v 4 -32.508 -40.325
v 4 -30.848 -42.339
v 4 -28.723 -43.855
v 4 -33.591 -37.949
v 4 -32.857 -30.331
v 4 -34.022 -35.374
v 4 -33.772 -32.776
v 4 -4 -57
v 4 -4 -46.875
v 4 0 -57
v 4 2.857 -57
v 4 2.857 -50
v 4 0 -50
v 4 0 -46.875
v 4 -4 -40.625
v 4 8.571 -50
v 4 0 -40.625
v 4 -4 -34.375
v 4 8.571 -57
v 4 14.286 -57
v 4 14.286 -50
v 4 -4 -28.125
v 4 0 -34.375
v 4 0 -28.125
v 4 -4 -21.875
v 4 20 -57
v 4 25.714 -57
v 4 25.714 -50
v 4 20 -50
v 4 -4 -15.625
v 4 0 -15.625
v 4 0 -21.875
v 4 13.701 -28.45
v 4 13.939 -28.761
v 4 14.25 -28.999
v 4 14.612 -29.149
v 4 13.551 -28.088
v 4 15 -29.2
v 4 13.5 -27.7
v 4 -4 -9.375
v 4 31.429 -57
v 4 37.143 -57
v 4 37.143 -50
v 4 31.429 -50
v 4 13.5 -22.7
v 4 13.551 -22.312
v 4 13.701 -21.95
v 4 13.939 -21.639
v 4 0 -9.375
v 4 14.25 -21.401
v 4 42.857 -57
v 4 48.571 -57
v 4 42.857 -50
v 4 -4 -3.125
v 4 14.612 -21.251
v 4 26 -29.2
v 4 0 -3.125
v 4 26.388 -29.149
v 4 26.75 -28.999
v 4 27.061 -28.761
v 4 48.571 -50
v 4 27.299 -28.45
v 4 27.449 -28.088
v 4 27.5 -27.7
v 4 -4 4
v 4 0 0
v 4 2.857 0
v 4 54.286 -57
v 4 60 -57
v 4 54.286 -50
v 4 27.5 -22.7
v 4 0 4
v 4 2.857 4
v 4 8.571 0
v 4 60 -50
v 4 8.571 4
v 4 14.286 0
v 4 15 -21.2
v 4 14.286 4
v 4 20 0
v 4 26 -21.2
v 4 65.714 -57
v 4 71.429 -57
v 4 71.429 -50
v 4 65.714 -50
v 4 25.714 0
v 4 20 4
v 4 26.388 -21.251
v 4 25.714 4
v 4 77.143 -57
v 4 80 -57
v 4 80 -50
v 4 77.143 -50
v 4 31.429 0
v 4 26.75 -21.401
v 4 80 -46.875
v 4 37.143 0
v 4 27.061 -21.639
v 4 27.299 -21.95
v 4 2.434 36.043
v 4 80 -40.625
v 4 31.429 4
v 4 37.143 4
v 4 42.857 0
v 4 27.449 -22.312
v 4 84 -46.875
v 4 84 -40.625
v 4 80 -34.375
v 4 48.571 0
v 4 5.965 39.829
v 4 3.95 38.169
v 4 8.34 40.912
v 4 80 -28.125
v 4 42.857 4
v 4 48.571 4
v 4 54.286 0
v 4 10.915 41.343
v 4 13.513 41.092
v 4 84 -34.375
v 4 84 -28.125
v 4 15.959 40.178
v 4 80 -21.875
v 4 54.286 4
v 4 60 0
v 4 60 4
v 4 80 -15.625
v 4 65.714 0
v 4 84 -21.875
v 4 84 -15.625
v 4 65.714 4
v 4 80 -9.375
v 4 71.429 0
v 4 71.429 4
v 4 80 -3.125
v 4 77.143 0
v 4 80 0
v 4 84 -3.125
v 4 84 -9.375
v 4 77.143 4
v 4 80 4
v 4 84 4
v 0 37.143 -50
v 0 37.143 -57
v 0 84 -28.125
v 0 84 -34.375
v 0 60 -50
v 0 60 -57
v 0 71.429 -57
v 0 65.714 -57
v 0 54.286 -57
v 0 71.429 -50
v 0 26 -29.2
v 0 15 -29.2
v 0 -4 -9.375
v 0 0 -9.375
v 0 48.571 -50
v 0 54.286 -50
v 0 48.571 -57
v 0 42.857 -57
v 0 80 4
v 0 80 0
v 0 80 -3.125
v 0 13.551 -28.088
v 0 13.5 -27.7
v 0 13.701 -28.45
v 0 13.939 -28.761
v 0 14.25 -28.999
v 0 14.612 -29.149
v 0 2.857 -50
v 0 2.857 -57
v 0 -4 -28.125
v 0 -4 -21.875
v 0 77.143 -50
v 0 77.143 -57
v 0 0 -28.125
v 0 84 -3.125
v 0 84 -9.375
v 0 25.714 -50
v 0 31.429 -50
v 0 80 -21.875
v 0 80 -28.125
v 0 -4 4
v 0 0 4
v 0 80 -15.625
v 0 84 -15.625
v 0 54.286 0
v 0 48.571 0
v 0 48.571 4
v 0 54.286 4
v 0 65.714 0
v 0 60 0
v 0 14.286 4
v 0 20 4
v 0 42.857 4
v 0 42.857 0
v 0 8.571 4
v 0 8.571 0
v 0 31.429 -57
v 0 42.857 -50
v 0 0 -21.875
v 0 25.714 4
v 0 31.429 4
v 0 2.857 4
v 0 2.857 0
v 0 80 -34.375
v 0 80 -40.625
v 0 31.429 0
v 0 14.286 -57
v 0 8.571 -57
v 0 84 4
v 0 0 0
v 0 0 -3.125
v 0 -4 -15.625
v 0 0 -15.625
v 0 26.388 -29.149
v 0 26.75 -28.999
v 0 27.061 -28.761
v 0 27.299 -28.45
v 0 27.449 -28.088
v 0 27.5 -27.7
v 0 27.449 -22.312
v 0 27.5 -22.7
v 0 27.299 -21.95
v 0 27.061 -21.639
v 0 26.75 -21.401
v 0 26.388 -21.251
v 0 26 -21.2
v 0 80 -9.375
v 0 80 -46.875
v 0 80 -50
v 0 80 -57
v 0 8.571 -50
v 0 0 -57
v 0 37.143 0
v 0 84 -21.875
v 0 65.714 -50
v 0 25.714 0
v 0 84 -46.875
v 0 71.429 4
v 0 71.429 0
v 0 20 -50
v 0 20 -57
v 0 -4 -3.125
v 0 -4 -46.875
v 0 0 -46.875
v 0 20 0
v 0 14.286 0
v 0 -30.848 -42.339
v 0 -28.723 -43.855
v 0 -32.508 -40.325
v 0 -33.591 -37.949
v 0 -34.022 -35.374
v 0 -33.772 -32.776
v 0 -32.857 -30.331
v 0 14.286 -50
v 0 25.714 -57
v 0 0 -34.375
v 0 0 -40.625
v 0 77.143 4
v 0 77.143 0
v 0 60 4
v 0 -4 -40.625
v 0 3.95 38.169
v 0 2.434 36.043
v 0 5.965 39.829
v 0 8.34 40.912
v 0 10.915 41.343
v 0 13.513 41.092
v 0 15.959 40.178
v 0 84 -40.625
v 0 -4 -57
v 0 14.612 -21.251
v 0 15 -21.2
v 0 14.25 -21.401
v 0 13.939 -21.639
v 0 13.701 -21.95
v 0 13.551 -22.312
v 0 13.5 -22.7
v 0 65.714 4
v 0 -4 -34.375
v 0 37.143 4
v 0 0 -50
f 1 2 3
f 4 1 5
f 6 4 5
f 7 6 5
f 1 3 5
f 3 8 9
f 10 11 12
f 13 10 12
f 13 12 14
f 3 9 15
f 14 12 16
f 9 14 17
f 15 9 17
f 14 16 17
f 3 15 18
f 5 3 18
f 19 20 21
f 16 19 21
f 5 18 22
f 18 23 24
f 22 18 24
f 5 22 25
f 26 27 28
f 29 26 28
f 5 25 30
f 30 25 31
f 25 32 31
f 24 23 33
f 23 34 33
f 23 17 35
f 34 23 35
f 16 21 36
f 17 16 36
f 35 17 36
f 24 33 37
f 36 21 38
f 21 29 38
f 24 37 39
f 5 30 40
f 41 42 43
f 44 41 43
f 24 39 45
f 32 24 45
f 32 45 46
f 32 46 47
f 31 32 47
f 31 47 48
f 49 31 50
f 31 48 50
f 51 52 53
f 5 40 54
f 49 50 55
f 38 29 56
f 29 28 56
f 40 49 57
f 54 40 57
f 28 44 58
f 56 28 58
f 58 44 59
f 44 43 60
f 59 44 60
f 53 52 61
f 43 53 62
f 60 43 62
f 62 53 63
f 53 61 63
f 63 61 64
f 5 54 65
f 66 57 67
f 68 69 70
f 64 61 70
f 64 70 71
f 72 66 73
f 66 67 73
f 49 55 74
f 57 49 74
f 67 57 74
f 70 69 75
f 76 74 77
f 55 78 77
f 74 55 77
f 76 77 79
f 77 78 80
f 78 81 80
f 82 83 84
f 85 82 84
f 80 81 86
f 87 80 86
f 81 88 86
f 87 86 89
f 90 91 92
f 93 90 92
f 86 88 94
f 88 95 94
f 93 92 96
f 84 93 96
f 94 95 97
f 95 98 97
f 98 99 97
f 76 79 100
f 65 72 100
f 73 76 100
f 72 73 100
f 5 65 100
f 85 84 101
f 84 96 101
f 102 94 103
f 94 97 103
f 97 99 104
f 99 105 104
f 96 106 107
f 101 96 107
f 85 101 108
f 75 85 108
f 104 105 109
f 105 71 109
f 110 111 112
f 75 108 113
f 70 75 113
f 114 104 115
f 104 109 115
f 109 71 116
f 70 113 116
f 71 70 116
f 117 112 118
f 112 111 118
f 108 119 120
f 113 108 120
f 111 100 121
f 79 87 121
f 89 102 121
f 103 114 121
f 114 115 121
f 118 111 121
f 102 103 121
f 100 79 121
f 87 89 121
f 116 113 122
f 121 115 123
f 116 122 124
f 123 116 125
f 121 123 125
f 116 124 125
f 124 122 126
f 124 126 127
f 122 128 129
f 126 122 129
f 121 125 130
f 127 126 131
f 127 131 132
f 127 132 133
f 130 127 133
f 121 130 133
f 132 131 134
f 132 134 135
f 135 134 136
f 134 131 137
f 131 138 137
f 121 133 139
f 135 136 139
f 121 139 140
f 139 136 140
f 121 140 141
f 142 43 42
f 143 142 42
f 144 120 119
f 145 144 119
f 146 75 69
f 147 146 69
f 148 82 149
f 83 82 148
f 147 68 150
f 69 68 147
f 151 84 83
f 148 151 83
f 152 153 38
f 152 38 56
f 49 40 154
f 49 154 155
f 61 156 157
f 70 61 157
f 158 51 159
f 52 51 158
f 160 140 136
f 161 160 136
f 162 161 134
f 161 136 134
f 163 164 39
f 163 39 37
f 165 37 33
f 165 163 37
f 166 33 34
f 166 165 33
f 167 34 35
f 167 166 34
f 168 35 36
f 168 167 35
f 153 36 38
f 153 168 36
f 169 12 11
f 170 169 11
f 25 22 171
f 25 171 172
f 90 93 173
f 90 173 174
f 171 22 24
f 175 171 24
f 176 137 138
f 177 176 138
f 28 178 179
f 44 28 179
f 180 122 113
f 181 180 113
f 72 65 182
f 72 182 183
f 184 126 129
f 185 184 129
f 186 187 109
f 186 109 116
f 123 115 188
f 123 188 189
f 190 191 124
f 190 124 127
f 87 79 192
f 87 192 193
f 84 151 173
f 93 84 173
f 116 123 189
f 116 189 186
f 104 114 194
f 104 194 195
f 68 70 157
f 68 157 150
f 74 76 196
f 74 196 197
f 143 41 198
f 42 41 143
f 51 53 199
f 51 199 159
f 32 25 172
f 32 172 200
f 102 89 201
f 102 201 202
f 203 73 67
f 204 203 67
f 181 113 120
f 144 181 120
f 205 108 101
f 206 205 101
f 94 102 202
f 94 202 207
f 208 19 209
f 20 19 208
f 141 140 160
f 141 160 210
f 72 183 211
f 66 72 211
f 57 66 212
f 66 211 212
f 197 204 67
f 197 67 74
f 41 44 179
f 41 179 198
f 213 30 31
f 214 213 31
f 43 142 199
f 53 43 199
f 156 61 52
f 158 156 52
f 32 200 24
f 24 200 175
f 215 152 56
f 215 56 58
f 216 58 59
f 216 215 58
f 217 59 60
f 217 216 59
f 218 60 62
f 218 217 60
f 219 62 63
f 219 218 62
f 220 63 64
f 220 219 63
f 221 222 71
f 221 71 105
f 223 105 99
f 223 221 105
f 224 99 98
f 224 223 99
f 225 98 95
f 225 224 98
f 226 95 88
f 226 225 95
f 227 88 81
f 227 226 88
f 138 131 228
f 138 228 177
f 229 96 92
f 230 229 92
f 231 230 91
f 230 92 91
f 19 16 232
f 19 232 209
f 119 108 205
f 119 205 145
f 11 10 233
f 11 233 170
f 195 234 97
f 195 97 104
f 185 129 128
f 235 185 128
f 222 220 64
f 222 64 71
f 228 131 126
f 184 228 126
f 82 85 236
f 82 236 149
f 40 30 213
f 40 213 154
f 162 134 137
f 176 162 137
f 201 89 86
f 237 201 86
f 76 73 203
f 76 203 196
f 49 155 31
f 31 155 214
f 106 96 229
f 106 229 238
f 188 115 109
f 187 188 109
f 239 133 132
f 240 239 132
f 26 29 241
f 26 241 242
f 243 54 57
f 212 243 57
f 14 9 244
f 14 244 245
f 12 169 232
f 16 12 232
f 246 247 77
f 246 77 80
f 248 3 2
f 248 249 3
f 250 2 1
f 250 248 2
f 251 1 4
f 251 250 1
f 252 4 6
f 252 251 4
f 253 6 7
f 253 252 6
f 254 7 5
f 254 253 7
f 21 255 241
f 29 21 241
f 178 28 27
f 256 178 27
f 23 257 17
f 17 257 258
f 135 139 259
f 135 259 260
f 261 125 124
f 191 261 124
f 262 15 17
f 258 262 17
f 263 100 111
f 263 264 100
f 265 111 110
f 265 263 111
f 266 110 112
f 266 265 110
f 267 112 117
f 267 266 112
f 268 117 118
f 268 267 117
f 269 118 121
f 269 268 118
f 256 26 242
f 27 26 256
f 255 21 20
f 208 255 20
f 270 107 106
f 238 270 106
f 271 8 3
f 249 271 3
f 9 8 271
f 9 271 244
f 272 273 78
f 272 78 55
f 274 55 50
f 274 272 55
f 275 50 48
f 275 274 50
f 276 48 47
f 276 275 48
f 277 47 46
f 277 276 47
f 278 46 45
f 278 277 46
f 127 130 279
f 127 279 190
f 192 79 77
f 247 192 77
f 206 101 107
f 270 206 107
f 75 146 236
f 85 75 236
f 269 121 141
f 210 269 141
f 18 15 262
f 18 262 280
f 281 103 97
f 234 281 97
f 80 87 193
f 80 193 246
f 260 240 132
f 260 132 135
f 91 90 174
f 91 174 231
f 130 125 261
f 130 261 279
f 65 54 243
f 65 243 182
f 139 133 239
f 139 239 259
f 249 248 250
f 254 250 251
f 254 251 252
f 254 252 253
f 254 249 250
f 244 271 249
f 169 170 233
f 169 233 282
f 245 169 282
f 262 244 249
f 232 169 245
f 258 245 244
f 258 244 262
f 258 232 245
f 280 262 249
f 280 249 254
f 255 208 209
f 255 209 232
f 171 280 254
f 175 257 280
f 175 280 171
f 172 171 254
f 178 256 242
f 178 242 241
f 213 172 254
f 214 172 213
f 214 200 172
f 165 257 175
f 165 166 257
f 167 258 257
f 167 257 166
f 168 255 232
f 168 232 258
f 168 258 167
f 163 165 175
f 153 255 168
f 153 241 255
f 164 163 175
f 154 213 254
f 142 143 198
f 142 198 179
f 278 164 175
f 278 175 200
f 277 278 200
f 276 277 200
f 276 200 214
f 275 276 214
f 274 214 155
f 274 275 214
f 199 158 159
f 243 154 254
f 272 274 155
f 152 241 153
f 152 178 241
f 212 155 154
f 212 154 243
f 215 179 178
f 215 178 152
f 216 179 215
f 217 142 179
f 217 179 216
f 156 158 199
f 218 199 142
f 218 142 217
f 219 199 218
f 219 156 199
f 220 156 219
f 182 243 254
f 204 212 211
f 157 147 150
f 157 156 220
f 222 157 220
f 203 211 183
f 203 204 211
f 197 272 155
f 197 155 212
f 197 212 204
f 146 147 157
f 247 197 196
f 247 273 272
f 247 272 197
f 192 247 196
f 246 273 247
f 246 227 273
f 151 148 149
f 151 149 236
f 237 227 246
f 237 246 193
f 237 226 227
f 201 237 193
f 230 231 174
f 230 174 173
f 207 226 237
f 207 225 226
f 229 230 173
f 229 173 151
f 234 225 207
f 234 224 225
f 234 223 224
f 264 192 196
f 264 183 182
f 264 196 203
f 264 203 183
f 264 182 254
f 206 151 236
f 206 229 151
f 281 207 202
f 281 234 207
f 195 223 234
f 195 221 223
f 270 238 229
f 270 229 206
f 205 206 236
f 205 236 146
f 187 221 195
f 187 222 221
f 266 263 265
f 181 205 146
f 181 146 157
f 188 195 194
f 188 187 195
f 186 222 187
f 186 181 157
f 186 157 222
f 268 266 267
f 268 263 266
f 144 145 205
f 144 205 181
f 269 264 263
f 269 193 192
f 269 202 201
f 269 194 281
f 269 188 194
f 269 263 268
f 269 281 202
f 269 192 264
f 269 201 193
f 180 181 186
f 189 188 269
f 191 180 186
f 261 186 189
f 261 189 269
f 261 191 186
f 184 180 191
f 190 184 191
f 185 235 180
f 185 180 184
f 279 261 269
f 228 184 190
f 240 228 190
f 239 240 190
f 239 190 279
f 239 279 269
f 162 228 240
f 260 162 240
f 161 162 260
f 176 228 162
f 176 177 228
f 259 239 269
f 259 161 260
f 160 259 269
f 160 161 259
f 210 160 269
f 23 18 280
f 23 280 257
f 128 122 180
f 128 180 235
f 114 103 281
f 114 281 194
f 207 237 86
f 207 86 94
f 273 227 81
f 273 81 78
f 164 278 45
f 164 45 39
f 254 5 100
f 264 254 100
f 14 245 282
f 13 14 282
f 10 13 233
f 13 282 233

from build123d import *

# Parameters (mm, degrees)
SCHIZZO1_W                    = 50
SCHIZZO1_H                    = 80
ESTRUSIONE_ESTRUSIONE1_DEPTH  = 4
SCHIZZO2_W                    = 4
SCHIZZO2_H                    = 2.857142857
SCHIZZO2_W_2                  = 7
ESTRUSIONE_ESTRUSIONE2_DEPTH  = 4
SCHIZZO3_W                    = 4
SCHIZZO3_H                    = 5.714285715
SCHIZZO3_W_2                  = 7
ESTRUSIONE_ESTRUSIONE3_DEPTH  = 4
RIPETIZIONE_A_L1_COUNT        = 6
RIPETIZIONE_A_L1_PITCH        = 11.428571
SCHIZZO4_W                    = 6.25
SCHIZZO4_H                    = 4
ESTRUSIONE_ESTRUSIONE4_DEPTH  = 4
RIPETIZIONE_A_L2_COUNT        = 4
RIPETIZIONE_A_L2_PITCH        = 12.5
ESTRUSIONE_ESTRUSIONE5_DEPTH  = 4
RACCORDO1_R                   = 10
TAGLIO_ESTRUSIONE1_DEPTH      = 102.592322545
TAGLIO_ESTRUSIONE1_DEPTH_BACK = 102.592322545


with BuildPart() as part:
    # Schizzo1 → Estrusione-Estrusione1 (new body)
    with BuildSketch(Plane(origin=(0, 0, 0), x_dir=(0, 0, -1), z_dir=(1, 0, 0))):
        with Locations((25, 40)):
            Rectangle(SCHIZZO1_W, SCHIZZO1_H)
    extrude(amount=ESTRUSIONE_ESTRUSIONE1_DEPTH)

    # Schizzo2 → Estrusione-Estrusione2 (add)
    with BuildSketch(Plane(origin=(4, 0, 0), x_dir=(0, 0, -1), z_dir=(1, 0, 0))):
        with Locations((-2, 78.571428572)):
            Rectangle(SCHIZZO2_W, SCHIZZO2_H)
        with Locations((53.5, 78.571428572)):
            Rectangle(SCHIZZO2_W_2, SCHIZZO2_H)
        with Locations((53.5, 1.428571429)):
            Rectangle(SCHIZZO2_W_2, SCHIZZO2_H)
        with Locations((-2, 1.428571429)):
            Rectangle(SCHIZZO2_W, SCHIZZO2_H)
    extrude(amount=-ESTRUSIONE_ESTRUSIONE2_DEPTH)

    # Schizzo3 → Estrusione-Estrusione3 (add)
    with BuildSketch(Plane(origin=(4, 0, 0), x_dir=(0, 0, -1), z_dir=(1, 0, 0))):
        with Locations((-2, 68.571428572)):
            Rectangle(SCHIZZO3_W, SCHIZZO3_H)
        with Locations((53.5, 68.571428572)):
            Rectangle(SCHIZZO3_W_2, SCHIZZO3_H)
    estrusione_estrusione3 = extrude(amount=-ESTRUSIONE_ESTRUSIONE3_DEPTH)

    # Ripetizione a L1: Estrusione-Estrusione3 ×6
    with Locations(*[(0, -i * RIPETIZIONE_A_L1_PITCH, 0) for i in range(1, RIPETIZIONE_A_L1_COUNT)]):
        add(estrusione_estrusione3)

    # Schizzo4 → Estrusione-Estrusione4 (add)
    with BuildSketch(Plane(origin=(4, 0, 0), x_dir=(0, 0, -1), z_dir=(1, 0, 0))):
        with Locations((6.25, 82)):
            Rectangle(SCHIZZO4_W, SCHIZZO4_H)
        with Locations((6.25, -2)):
            Rectangle(SCHIZZO4_W, SCHIZZO4_H)
    estrusione_estrusione4 = extrude(amount=-ESTRUSIONE_ESTRUSIONE4_DEPTH)

    # Ripetizione a L2: Estrusione-Estrusione4 ×4
    with Locations(*[(0, 0, -i * RIPETIZIONE_A_L2_PITCH) for i in range(1, RIPETIZIONE_A_L2_COUNT)]):
        add(estrusione_estrusione4)

    # Schizzo5 → Estrusione-Estrusione5 (add)
    with BuildSketch(Plane(origin=(4, 0, 0), x_dir=(0, 0, -1), z_dir=(1, 0, 0))):
        Polygon((46.875, -4), (57, -4), (39.160080614, -37.552008529), (-44.872956134, 7.129149682), (-4, 84), (-4, 80), (-4, -4), align=None)
    extrude(amount=-ESTRUSIONE_ESTRUSIONE5_DEPTH)

    # Raccordo1
    raccordo1_edges = [part.edges().sort_by_distance(p)[0] for p in [
        (2, -37.552008529, -39.160080614),
        (2, 7.129149682, 44.872956134),
    ]]
    fillet(raccordo1_edges, radius=RACCORDO1_R)

    # Schizzo6 → Taglio-Estrusione1 (cut, two sides: drawn at the far end of the back side and taken through both)
    with BuildSketch(Plane(origin=(4, 0, 0), x_dir=(0, 0, -1), z_dir=(1, 0, 0)).offset(-TAGLIO_ESTRUSIONE1_DEPTH_BACK)):
        with BuildLine():
            Line((21.2, 26), (21.2, 15))
            ThreePointArc((21.2, 15), (21.639339828, 13.939339828), (22.7, 13.5))
            Line((22.7, 13.5), (27.7, 13.5))
            ThreePointArc((27.7, 13.5), (28.760660172, 13.939339828), (29.2, 15))
            Line((29.2, 15), (29.2, 26))
            ThreePointArc((29.2, 26), (28.760660172, 27.060660172), (27.7, 27.5))
            Line((27.7, 27.5), (22.7, 27.5))
            ThreePointArc((22.7, 27.5), (21.639339828, 27.060660172), (21.2, 26))
        make_face()
    extrude(amount=TAGLIO_ESTRUSIONE1_DEPTH + TAGLIO_ESTRUSIONE1_DEPTH_BACK, mode=Mode.SUBTRACT)


solid = part.part
